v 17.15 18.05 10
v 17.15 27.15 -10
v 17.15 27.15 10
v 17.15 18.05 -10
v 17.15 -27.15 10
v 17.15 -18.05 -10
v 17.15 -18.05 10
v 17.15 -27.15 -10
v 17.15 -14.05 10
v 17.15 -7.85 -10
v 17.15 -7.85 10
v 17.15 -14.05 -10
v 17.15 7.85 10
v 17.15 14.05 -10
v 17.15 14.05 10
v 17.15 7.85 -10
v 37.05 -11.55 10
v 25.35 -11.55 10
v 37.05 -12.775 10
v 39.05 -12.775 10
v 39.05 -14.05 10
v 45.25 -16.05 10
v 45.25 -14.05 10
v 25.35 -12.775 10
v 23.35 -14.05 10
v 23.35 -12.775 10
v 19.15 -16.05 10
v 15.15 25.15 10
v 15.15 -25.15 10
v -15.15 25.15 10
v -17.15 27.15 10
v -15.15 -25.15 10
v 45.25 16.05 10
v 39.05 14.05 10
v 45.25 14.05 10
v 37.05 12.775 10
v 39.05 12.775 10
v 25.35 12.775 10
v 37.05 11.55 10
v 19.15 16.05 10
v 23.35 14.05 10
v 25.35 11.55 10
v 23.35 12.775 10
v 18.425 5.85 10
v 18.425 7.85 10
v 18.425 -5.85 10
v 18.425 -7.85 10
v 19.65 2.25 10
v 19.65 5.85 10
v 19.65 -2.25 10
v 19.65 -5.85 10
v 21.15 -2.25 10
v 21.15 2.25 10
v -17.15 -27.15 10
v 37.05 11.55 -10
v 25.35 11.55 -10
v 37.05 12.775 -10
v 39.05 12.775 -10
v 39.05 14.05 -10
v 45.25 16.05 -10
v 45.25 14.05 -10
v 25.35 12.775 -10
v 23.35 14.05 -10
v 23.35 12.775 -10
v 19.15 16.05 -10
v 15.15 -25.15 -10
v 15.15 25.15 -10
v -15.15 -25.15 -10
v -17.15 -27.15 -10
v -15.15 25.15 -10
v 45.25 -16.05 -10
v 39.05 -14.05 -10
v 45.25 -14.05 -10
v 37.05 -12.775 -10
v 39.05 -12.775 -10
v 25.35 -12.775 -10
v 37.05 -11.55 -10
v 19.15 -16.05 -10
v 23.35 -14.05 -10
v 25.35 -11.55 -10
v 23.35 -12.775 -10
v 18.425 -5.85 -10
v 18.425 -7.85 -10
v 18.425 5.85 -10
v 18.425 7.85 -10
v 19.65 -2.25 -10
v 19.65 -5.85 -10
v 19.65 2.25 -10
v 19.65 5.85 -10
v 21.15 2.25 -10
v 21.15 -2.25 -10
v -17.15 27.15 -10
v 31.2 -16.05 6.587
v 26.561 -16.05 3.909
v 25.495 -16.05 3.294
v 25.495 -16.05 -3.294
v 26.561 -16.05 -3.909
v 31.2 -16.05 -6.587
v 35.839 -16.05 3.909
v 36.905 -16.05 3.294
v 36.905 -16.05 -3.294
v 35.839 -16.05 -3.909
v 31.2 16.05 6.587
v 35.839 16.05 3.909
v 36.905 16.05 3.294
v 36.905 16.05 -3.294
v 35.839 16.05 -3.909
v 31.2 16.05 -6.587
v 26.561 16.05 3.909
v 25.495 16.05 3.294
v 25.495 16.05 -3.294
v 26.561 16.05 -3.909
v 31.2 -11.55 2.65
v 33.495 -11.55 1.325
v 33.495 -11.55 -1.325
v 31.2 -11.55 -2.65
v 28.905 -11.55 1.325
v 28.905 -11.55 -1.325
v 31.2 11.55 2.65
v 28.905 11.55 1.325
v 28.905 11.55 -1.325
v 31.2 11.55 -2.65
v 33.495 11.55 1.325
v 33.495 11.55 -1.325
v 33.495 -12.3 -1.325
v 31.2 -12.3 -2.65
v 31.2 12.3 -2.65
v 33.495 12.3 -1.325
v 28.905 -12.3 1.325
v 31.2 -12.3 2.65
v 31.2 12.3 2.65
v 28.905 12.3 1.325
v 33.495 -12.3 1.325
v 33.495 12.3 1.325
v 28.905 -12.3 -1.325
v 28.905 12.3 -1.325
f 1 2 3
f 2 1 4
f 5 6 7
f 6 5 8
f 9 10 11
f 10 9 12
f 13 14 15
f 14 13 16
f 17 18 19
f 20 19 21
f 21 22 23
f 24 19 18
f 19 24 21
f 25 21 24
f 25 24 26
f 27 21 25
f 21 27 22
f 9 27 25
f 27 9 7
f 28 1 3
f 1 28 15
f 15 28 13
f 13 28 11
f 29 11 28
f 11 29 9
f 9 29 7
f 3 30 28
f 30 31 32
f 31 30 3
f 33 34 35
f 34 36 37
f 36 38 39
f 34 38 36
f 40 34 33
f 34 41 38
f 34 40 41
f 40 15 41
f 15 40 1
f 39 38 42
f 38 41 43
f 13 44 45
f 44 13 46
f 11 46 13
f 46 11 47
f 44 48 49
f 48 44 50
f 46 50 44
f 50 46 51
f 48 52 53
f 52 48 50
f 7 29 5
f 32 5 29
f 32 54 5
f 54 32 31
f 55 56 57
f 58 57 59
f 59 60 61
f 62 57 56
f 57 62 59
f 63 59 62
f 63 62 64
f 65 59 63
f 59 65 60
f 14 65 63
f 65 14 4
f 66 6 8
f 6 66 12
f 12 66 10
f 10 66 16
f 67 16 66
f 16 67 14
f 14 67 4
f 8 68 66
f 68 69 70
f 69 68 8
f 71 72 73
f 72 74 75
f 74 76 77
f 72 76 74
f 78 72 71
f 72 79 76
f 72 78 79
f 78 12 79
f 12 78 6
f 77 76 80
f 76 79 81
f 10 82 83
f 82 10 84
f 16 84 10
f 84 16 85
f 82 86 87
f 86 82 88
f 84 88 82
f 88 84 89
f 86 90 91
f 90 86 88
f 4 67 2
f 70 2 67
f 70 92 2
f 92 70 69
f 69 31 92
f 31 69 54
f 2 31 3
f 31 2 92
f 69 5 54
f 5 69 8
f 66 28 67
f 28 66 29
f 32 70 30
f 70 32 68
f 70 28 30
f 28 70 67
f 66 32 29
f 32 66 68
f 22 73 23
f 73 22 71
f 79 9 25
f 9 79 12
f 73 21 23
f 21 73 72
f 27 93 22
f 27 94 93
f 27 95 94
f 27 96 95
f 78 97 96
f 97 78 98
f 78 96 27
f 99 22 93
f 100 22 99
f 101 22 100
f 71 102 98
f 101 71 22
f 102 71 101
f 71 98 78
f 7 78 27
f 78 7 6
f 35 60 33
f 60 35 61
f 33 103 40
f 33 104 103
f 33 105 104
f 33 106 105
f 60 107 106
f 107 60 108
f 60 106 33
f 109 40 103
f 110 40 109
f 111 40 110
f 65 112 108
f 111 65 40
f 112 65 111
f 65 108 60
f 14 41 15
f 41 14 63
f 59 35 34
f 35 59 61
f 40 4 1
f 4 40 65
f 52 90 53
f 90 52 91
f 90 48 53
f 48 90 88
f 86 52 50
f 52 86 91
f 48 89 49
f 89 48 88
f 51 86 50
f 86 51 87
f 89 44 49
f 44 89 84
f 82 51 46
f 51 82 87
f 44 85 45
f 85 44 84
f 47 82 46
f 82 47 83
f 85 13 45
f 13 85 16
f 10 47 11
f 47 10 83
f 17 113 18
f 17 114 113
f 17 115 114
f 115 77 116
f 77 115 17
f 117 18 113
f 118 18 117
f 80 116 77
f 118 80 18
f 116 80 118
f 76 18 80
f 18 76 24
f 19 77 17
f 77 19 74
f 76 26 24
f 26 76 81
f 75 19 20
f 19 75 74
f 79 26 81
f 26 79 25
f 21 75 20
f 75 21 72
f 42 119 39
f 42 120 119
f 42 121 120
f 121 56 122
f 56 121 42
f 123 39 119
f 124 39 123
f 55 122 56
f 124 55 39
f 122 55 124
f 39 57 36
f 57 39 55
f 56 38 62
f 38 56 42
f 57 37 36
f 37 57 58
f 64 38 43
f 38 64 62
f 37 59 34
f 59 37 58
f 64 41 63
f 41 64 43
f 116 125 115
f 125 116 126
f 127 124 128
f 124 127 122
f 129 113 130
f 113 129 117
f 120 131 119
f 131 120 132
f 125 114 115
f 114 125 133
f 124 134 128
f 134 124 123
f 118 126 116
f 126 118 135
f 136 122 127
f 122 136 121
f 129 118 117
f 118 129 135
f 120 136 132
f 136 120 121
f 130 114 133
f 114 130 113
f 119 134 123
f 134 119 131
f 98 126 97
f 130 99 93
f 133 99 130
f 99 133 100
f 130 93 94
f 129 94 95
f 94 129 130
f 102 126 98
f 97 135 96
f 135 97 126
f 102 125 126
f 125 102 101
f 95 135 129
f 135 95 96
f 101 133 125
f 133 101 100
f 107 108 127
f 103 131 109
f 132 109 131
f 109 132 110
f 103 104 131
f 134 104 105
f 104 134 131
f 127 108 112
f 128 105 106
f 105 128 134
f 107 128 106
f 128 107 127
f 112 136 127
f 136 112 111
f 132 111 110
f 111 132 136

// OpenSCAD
// [FL_INDEX: keywords="openscad, 3d_parametric, Power_Supply_Brackets_for_K8200_printer, csg_solid" | COT="Parametric OpenSCAD design from 3DCodeverse"]
// Title: Power Supply Brackets for K8200 printer



dim = [ 30, 50 ];
//dim = [ 38, 64 ];

c = 0.3;

w = dim[0]+c;
h = dim[1]+c;
l = 20;
t = 2;
b = 27.5+c*2;

difference()
{
	cube( [ w+t*2, h+t*2, l ], center = true );

	cube( [ w, h, l*2 ], center = true );
}

translate( [ w/2+t+b/2, 0, 0 ] )
difference()
{
	union()
	{
		for ( a = [ -1, +1 ] )
		{
			translate( [ 0, a*( b/2+t/2 ), 0 ] )
				cube( [ b, t, l ], center = true );
			translate( [ -b/2, a*( b/2+t ), 0 ] )
				cylinder( r = t, h = l, center = true, $fn = 4 );
		}

		for ( a = [ 0, 90, 270 ] ) rotate( [ 0, 0, a ] )
		{
			if ( a == 0 )
		translate( [ -b/2+1.5, 0, 0 ] )
			cube( [ 5, 4.5, l ], center = true );

		translate( [-b/2+0.75, 0, 0 ] )
			cube( [ 1+2.5, 12-c, l ], center = true );

		translate( [ -b/2+0.15, 0, 0 ] )
			cube( [ 1+1.25, 16-c, l ], center = true );
		}
	}

	//translate( [ w/2+t+3.5+2, 0, 0 ] )
	//	cube( [ 5.5, 10, 10 ], center = true );

	for ( a = [ 90, 270 ] ) rotate( [ 0, 0, a ] )
	{
		translate( [ -b/2-1, 0, 0 ] ) rotate( [ 0, 90, 0 ] )
			cylinder( r = 2.65, h = 40, center = true, $fn = 6 );

		translate( [ -b/2-1.75, 0, 0 ] ) rotate( [ 0, 90, 0 ] )
			cylinder( r2 = 2.65, r1 = 10, h = 7, center = true, $fn = 6 );
	}
}
